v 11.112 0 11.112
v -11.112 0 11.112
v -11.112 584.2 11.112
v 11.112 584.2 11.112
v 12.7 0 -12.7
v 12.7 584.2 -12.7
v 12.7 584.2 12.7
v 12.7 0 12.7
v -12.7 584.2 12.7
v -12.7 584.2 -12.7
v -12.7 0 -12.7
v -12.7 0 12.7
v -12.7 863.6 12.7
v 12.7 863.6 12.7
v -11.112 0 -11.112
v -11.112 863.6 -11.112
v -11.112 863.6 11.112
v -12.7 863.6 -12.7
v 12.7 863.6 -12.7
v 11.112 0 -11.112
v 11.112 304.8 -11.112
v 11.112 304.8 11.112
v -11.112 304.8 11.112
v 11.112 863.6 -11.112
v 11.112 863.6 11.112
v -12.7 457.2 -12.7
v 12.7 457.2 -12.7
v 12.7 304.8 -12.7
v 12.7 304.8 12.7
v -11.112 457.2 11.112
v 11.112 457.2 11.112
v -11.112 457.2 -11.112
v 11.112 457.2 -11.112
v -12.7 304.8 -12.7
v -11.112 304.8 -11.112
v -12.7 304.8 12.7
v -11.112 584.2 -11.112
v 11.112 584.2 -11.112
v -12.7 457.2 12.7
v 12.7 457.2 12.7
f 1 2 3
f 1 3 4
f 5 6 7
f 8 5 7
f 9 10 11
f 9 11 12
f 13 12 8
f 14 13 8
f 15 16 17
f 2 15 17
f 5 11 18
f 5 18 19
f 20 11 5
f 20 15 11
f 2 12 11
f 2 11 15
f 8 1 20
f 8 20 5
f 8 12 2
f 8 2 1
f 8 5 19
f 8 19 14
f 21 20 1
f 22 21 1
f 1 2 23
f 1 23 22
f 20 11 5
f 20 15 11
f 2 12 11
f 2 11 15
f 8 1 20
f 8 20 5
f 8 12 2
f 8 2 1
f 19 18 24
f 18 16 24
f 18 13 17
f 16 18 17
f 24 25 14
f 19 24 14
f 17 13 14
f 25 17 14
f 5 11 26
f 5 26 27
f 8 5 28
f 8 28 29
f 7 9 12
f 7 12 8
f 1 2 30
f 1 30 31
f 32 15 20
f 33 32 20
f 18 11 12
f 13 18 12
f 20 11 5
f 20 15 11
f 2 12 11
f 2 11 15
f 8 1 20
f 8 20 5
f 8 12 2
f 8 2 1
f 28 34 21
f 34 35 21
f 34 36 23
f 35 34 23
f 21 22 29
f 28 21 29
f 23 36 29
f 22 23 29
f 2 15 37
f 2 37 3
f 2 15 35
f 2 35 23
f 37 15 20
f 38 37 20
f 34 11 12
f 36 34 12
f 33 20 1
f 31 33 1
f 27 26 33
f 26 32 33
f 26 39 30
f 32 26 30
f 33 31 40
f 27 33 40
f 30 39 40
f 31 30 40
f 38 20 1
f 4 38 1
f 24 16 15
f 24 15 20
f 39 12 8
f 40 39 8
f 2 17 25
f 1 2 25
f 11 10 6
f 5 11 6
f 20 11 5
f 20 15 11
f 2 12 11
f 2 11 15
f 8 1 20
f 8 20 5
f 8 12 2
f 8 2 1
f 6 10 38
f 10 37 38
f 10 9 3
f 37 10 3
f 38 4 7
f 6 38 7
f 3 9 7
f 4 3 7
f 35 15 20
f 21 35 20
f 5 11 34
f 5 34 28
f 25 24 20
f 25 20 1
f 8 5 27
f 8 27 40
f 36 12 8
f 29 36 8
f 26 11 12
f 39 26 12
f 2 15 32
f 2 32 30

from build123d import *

# Parameters (mm, degrees)
F0_W     = 25.4
F0_H     = 25.4
F0_W_2   = 22.225
F0_H_2   = 22.225
F1_DEPTH = 584.2
F2_DEPTH = 863.6
F3_DEPTH = 304.8
F4_DEPTH = 457.2


with BuildPart() as f1:
    # F0 (on Front) → F1 (new body)
    with BuildSketch(Plane.XZ):
        Rectangle(F0_W, F0_H)
        Rectangle(F0_W_2, F0_H_2, mode=Mode.SUBTRACT)
    extrude(amount=-F1_DEPTH)


with BuildPart() as f2:
    # F0 (on Front) → F2 (new body)
    with BuildSketch(Plane.XZ):
        Rectangle(F0_W, F0_H)
        Rectangle(F0_W_2, F0_H_2, mode=Mode.SUBTRACT)
    extrude(amount=-F2_DEPTH)


with BuildPart() as f3:
    # F0 (on Front) → F3 (new body)
    with BuildSketch(Plane.XZ):
        Rectangle(F0_W, F0_H)
        Rectangle(F0_W_2, F0_H_2, mode=Mode.SUBTRACT)
    extrude(amount=-F3_DEPTH)


with BuildPart() as f4:
    # F0 (on Front) → F4 (new body)
    with BuildSketch(Plane.XZ):
        Rectangle(F0_W, F0_H)
        Rectangle(F0_W_2, F0_H_2, mode=Mode.SUBTRACT)
    extrude(amount=-F4_DEPTH)


solid = Compound([f1.part, f2.part, f3.part, f4.part])
